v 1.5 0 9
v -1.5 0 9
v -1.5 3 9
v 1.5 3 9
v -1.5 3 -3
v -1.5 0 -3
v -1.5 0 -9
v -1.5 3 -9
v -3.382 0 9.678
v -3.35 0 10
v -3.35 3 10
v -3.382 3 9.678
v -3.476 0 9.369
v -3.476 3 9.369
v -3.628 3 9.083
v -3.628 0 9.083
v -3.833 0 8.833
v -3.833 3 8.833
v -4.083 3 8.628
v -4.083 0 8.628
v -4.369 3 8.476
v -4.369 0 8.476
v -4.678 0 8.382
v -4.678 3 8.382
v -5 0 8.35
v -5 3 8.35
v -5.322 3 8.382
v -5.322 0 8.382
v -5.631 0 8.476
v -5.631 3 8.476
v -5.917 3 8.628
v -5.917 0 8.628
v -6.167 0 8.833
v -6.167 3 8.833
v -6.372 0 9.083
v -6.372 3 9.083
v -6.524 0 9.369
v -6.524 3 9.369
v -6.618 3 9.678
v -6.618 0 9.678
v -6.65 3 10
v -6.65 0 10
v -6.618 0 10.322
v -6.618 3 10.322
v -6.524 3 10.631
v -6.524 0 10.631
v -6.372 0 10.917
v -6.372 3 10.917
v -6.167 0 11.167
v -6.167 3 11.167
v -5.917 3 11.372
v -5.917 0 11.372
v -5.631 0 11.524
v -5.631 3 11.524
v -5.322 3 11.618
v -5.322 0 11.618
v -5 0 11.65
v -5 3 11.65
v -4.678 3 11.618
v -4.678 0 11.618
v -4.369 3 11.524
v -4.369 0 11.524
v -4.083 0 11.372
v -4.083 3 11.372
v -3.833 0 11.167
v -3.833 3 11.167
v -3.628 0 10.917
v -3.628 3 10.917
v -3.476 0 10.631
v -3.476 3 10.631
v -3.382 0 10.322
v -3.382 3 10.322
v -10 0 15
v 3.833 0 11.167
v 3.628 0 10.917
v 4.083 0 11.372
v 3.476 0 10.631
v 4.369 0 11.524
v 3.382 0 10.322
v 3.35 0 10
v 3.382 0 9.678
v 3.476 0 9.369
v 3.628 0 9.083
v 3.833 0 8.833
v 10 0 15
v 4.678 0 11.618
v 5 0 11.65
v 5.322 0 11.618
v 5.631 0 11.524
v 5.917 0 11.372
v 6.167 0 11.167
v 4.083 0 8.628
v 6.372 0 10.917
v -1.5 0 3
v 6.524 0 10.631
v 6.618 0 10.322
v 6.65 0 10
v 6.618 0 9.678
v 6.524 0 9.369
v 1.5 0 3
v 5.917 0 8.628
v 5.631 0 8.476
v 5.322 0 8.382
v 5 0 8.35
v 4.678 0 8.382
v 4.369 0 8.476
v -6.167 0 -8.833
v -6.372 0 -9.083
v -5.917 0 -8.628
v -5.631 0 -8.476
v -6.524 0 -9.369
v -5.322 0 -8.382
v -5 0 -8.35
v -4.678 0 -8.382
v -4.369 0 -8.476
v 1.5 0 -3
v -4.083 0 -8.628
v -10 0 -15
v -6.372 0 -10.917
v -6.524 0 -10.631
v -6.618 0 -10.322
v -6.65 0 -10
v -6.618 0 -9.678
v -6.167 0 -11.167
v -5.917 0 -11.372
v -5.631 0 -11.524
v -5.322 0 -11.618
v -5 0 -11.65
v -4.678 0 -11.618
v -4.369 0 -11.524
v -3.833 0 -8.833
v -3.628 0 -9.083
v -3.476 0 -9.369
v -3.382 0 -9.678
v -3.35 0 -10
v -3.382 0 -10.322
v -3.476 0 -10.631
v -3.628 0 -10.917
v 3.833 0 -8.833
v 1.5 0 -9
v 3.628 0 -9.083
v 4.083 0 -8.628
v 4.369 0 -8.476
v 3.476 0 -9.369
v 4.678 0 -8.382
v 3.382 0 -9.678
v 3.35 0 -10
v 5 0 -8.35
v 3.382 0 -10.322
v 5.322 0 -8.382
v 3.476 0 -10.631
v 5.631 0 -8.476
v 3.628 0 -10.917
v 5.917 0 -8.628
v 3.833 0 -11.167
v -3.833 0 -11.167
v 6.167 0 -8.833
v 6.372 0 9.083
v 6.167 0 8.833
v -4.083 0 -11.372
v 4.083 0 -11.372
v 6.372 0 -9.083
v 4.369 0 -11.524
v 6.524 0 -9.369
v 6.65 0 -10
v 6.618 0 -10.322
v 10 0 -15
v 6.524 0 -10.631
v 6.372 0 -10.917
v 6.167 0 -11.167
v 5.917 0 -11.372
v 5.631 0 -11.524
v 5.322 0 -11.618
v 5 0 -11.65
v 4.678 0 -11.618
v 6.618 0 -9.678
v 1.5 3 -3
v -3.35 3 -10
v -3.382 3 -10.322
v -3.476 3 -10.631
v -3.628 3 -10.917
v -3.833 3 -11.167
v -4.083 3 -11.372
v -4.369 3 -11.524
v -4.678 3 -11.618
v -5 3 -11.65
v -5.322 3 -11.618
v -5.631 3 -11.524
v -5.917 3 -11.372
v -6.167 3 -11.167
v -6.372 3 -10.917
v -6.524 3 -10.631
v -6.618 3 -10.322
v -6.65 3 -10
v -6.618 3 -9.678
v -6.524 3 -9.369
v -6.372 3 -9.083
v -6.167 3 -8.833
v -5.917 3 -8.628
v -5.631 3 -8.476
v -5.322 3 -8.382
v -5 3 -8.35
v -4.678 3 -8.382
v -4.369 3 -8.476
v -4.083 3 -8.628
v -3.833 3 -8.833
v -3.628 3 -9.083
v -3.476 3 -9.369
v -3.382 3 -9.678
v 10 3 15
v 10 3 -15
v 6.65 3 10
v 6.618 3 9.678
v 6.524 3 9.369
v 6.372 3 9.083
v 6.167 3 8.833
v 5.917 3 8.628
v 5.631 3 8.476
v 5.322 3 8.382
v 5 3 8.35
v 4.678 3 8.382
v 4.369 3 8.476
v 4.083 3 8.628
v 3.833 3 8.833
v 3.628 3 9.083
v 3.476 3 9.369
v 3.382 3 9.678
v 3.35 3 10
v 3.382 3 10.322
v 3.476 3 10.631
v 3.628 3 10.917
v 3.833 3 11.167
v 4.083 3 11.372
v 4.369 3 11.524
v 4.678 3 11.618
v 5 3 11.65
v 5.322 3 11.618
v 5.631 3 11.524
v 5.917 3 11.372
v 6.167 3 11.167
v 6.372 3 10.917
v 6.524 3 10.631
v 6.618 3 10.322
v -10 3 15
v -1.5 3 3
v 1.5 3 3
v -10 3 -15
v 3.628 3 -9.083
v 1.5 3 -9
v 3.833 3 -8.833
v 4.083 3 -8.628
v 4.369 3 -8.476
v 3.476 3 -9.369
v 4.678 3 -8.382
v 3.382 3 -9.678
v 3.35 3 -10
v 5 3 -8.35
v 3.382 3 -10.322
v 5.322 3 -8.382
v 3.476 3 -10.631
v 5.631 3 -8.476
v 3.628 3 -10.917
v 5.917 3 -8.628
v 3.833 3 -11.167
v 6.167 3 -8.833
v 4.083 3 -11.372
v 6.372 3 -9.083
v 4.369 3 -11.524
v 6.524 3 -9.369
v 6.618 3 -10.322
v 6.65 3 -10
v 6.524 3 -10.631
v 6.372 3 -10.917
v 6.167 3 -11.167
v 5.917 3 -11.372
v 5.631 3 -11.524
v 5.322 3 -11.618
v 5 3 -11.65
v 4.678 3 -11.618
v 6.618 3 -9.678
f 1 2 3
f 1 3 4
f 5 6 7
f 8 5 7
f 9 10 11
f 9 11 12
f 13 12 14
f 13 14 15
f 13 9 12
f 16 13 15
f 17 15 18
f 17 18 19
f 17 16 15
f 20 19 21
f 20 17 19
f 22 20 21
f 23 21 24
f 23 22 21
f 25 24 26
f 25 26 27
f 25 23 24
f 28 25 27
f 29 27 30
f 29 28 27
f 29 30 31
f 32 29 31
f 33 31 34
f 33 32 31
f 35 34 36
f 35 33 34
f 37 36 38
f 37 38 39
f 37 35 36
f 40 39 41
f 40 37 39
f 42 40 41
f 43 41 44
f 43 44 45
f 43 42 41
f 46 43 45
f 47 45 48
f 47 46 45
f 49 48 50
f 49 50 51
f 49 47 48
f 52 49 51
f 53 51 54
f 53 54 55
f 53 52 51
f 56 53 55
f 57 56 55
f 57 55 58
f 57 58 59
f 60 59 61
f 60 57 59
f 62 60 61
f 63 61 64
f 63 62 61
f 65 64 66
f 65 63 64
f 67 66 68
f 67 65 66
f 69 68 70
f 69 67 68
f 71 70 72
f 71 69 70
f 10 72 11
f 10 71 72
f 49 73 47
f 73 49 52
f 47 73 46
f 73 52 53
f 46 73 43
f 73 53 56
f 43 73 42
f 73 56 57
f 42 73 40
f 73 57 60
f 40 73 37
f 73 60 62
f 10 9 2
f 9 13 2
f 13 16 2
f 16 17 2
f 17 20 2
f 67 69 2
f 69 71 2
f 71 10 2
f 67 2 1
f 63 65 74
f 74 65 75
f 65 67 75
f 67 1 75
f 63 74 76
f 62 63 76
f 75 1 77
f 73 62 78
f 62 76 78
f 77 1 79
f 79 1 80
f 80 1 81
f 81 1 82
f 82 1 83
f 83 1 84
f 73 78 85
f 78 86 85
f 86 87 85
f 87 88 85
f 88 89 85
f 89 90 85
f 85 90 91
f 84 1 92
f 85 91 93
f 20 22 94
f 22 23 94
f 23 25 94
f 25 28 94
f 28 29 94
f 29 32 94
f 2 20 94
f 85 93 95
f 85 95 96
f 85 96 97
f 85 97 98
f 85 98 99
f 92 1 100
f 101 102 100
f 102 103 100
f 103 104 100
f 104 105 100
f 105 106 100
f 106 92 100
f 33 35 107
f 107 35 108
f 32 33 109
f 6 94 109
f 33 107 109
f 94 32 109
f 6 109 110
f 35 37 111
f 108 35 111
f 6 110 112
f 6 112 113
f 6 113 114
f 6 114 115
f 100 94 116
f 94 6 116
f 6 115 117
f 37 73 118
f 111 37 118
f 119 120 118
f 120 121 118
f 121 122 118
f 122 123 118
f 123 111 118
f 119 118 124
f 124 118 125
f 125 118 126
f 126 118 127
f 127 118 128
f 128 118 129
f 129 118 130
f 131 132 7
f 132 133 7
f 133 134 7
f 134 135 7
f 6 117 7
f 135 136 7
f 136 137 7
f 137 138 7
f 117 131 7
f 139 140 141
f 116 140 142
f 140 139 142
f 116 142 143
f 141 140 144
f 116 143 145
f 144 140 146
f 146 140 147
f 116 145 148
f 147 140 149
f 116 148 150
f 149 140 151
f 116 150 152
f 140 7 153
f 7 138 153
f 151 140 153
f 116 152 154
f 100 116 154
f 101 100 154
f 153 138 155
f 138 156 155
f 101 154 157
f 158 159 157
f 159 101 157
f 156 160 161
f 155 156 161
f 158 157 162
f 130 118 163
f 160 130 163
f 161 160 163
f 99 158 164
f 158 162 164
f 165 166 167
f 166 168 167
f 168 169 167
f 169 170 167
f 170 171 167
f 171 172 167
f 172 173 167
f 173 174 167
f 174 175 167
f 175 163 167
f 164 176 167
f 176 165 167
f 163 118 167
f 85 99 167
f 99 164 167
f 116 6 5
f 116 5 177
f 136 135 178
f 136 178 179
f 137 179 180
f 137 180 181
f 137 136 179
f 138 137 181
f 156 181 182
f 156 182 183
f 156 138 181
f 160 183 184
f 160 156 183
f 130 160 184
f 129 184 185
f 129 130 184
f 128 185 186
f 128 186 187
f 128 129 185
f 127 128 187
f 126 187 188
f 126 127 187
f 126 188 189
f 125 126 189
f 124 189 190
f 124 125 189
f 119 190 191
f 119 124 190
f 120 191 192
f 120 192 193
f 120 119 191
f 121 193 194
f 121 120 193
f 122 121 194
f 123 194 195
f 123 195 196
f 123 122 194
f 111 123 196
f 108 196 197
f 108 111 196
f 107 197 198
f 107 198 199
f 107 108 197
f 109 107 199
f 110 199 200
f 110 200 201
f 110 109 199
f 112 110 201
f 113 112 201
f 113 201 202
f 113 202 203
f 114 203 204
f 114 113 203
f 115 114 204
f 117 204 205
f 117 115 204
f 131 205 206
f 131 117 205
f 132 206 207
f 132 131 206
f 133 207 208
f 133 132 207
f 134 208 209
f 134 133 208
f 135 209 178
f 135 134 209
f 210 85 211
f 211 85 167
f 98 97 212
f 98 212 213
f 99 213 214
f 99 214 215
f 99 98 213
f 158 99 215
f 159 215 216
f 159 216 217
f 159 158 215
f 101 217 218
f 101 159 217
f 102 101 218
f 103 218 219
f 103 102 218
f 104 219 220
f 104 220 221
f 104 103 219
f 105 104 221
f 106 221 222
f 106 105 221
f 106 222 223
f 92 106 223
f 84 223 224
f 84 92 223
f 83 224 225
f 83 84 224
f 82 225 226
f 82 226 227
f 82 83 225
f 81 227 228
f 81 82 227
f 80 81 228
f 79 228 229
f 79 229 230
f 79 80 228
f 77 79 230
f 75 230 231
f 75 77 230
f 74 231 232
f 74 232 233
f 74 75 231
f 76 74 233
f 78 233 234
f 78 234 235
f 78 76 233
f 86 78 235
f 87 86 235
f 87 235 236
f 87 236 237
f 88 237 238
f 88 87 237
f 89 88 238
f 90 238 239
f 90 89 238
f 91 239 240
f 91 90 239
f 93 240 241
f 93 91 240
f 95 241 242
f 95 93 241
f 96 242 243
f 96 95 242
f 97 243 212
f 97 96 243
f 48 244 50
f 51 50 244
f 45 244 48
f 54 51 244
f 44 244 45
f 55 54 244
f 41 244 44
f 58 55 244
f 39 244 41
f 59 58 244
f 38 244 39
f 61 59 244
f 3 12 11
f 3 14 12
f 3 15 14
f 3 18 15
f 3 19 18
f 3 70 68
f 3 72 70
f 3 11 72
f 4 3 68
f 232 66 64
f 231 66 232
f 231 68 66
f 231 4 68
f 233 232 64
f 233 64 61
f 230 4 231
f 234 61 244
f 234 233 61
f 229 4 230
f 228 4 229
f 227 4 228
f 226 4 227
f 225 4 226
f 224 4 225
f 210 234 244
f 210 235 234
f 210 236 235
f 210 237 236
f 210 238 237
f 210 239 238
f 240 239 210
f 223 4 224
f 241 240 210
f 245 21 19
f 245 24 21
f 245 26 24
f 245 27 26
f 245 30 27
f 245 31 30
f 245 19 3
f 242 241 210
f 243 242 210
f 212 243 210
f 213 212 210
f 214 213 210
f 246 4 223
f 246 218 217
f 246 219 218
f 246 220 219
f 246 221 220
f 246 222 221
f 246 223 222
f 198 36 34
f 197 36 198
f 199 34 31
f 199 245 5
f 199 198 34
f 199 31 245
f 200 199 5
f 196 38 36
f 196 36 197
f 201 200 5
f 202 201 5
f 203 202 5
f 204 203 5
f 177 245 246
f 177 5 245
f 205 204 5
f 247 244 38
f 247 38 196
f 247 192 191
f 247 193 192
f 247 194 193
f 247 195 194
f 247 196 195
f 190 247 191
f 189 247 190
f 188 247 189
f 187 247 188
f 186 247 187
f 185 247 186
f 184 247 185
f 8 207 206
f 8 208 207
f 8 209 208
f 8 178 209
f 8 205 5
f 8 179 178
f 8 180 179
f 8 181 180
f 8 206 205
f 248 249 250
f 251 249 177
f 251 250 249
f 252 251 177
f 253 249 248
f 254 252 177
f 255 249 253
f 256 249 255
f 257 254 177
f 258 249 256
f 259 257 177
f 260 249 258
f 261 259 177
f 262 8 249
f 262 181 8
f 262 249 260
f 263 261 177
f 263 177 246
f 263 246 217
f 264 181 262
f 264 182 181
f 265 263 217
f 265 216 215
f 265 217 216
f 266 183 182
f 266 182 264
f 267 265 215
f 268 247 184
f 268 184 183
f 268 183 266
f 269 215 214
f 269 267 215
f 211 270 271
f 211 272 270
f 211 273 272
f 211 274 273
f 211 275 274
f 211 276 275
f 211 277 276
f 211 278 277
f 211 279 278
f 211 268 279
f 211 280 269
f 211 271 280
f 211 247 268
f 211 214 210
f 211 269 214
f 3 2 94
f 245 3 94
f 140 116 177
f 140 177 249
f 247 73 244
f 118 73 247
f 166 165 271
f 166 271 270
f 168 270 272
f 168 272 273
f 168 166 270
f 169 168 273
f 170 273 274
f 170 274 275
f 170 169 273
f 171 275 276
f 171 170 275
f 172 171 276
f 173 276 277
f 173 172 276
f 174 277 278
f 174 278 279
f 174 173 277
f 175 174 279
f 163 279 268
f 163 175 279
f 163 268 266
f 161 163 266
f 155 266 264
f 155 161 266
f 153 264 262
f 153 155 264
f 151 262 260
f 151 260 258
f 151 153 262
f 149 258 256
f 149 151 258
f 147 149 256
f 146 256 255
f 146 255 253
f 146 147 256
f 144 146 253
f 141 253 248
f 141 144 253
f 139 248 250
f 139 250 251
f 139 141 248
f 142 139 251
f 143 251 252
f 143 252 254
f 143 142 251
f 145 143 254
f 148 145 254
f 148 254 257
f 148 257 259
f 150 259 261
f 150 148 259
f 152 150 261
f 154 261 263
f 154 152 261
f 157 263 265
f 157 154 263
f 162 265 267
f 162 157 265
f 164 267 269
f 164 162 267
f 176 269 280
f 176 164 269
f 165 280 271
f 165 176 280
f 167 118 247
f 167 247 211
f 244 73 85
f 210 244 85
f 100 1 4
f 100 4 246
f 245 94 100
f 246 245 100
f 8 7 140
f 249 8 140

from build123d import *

# Parameters (mm, degrees)
SKETCH1_W           = 20
SKETCH1_H           = 30
SKETCH1_R           = 1.65
SKETCH1_W_2         = 3
SKETCH1_H_2         = 6
BOSS_EXTRUDE1_DEPTH = 3


with BuildPart() as part:
    # Sketch1 → Boss-Extrude1 (new body)
    with BuildSketch(Plane(origin=(0, 0, 0), x_dir=(1, 0, 0), z_dir=(0, 1, 0))):
        Rectangle(SKETCH1_W, SKETCH1_H)
        with Locations((-5, -10)):
            Circle(SKETCH1_R, mode=Mode.SUBTRACT)
        with Locations((5, -10)):
            Circle(SKETCH1_R, mode=Mode.SUBTRACT)
        with Locations((5, 10)):
            Circle(SKETCH1_R, mode=Mode.SUBTRACT)
        with Locations((-5, 10)):
            Circle(SKETCH1_R, mode=Mode.SUBTRACT)
        with Locations((0, 6)):
            Rectangle(SKETCH1_W_2, SKETCH1_H_2, mode=Mode.SUBTRACT)
        with Locations((0, -6)):
            Rectangle(SKETCH1_W_2, SKETCH1_H_2, mode=Mode.SUBTRACT)
    extrude(amount=BOSS_EXTRUDE1_DEPTH)


solid = part.part
